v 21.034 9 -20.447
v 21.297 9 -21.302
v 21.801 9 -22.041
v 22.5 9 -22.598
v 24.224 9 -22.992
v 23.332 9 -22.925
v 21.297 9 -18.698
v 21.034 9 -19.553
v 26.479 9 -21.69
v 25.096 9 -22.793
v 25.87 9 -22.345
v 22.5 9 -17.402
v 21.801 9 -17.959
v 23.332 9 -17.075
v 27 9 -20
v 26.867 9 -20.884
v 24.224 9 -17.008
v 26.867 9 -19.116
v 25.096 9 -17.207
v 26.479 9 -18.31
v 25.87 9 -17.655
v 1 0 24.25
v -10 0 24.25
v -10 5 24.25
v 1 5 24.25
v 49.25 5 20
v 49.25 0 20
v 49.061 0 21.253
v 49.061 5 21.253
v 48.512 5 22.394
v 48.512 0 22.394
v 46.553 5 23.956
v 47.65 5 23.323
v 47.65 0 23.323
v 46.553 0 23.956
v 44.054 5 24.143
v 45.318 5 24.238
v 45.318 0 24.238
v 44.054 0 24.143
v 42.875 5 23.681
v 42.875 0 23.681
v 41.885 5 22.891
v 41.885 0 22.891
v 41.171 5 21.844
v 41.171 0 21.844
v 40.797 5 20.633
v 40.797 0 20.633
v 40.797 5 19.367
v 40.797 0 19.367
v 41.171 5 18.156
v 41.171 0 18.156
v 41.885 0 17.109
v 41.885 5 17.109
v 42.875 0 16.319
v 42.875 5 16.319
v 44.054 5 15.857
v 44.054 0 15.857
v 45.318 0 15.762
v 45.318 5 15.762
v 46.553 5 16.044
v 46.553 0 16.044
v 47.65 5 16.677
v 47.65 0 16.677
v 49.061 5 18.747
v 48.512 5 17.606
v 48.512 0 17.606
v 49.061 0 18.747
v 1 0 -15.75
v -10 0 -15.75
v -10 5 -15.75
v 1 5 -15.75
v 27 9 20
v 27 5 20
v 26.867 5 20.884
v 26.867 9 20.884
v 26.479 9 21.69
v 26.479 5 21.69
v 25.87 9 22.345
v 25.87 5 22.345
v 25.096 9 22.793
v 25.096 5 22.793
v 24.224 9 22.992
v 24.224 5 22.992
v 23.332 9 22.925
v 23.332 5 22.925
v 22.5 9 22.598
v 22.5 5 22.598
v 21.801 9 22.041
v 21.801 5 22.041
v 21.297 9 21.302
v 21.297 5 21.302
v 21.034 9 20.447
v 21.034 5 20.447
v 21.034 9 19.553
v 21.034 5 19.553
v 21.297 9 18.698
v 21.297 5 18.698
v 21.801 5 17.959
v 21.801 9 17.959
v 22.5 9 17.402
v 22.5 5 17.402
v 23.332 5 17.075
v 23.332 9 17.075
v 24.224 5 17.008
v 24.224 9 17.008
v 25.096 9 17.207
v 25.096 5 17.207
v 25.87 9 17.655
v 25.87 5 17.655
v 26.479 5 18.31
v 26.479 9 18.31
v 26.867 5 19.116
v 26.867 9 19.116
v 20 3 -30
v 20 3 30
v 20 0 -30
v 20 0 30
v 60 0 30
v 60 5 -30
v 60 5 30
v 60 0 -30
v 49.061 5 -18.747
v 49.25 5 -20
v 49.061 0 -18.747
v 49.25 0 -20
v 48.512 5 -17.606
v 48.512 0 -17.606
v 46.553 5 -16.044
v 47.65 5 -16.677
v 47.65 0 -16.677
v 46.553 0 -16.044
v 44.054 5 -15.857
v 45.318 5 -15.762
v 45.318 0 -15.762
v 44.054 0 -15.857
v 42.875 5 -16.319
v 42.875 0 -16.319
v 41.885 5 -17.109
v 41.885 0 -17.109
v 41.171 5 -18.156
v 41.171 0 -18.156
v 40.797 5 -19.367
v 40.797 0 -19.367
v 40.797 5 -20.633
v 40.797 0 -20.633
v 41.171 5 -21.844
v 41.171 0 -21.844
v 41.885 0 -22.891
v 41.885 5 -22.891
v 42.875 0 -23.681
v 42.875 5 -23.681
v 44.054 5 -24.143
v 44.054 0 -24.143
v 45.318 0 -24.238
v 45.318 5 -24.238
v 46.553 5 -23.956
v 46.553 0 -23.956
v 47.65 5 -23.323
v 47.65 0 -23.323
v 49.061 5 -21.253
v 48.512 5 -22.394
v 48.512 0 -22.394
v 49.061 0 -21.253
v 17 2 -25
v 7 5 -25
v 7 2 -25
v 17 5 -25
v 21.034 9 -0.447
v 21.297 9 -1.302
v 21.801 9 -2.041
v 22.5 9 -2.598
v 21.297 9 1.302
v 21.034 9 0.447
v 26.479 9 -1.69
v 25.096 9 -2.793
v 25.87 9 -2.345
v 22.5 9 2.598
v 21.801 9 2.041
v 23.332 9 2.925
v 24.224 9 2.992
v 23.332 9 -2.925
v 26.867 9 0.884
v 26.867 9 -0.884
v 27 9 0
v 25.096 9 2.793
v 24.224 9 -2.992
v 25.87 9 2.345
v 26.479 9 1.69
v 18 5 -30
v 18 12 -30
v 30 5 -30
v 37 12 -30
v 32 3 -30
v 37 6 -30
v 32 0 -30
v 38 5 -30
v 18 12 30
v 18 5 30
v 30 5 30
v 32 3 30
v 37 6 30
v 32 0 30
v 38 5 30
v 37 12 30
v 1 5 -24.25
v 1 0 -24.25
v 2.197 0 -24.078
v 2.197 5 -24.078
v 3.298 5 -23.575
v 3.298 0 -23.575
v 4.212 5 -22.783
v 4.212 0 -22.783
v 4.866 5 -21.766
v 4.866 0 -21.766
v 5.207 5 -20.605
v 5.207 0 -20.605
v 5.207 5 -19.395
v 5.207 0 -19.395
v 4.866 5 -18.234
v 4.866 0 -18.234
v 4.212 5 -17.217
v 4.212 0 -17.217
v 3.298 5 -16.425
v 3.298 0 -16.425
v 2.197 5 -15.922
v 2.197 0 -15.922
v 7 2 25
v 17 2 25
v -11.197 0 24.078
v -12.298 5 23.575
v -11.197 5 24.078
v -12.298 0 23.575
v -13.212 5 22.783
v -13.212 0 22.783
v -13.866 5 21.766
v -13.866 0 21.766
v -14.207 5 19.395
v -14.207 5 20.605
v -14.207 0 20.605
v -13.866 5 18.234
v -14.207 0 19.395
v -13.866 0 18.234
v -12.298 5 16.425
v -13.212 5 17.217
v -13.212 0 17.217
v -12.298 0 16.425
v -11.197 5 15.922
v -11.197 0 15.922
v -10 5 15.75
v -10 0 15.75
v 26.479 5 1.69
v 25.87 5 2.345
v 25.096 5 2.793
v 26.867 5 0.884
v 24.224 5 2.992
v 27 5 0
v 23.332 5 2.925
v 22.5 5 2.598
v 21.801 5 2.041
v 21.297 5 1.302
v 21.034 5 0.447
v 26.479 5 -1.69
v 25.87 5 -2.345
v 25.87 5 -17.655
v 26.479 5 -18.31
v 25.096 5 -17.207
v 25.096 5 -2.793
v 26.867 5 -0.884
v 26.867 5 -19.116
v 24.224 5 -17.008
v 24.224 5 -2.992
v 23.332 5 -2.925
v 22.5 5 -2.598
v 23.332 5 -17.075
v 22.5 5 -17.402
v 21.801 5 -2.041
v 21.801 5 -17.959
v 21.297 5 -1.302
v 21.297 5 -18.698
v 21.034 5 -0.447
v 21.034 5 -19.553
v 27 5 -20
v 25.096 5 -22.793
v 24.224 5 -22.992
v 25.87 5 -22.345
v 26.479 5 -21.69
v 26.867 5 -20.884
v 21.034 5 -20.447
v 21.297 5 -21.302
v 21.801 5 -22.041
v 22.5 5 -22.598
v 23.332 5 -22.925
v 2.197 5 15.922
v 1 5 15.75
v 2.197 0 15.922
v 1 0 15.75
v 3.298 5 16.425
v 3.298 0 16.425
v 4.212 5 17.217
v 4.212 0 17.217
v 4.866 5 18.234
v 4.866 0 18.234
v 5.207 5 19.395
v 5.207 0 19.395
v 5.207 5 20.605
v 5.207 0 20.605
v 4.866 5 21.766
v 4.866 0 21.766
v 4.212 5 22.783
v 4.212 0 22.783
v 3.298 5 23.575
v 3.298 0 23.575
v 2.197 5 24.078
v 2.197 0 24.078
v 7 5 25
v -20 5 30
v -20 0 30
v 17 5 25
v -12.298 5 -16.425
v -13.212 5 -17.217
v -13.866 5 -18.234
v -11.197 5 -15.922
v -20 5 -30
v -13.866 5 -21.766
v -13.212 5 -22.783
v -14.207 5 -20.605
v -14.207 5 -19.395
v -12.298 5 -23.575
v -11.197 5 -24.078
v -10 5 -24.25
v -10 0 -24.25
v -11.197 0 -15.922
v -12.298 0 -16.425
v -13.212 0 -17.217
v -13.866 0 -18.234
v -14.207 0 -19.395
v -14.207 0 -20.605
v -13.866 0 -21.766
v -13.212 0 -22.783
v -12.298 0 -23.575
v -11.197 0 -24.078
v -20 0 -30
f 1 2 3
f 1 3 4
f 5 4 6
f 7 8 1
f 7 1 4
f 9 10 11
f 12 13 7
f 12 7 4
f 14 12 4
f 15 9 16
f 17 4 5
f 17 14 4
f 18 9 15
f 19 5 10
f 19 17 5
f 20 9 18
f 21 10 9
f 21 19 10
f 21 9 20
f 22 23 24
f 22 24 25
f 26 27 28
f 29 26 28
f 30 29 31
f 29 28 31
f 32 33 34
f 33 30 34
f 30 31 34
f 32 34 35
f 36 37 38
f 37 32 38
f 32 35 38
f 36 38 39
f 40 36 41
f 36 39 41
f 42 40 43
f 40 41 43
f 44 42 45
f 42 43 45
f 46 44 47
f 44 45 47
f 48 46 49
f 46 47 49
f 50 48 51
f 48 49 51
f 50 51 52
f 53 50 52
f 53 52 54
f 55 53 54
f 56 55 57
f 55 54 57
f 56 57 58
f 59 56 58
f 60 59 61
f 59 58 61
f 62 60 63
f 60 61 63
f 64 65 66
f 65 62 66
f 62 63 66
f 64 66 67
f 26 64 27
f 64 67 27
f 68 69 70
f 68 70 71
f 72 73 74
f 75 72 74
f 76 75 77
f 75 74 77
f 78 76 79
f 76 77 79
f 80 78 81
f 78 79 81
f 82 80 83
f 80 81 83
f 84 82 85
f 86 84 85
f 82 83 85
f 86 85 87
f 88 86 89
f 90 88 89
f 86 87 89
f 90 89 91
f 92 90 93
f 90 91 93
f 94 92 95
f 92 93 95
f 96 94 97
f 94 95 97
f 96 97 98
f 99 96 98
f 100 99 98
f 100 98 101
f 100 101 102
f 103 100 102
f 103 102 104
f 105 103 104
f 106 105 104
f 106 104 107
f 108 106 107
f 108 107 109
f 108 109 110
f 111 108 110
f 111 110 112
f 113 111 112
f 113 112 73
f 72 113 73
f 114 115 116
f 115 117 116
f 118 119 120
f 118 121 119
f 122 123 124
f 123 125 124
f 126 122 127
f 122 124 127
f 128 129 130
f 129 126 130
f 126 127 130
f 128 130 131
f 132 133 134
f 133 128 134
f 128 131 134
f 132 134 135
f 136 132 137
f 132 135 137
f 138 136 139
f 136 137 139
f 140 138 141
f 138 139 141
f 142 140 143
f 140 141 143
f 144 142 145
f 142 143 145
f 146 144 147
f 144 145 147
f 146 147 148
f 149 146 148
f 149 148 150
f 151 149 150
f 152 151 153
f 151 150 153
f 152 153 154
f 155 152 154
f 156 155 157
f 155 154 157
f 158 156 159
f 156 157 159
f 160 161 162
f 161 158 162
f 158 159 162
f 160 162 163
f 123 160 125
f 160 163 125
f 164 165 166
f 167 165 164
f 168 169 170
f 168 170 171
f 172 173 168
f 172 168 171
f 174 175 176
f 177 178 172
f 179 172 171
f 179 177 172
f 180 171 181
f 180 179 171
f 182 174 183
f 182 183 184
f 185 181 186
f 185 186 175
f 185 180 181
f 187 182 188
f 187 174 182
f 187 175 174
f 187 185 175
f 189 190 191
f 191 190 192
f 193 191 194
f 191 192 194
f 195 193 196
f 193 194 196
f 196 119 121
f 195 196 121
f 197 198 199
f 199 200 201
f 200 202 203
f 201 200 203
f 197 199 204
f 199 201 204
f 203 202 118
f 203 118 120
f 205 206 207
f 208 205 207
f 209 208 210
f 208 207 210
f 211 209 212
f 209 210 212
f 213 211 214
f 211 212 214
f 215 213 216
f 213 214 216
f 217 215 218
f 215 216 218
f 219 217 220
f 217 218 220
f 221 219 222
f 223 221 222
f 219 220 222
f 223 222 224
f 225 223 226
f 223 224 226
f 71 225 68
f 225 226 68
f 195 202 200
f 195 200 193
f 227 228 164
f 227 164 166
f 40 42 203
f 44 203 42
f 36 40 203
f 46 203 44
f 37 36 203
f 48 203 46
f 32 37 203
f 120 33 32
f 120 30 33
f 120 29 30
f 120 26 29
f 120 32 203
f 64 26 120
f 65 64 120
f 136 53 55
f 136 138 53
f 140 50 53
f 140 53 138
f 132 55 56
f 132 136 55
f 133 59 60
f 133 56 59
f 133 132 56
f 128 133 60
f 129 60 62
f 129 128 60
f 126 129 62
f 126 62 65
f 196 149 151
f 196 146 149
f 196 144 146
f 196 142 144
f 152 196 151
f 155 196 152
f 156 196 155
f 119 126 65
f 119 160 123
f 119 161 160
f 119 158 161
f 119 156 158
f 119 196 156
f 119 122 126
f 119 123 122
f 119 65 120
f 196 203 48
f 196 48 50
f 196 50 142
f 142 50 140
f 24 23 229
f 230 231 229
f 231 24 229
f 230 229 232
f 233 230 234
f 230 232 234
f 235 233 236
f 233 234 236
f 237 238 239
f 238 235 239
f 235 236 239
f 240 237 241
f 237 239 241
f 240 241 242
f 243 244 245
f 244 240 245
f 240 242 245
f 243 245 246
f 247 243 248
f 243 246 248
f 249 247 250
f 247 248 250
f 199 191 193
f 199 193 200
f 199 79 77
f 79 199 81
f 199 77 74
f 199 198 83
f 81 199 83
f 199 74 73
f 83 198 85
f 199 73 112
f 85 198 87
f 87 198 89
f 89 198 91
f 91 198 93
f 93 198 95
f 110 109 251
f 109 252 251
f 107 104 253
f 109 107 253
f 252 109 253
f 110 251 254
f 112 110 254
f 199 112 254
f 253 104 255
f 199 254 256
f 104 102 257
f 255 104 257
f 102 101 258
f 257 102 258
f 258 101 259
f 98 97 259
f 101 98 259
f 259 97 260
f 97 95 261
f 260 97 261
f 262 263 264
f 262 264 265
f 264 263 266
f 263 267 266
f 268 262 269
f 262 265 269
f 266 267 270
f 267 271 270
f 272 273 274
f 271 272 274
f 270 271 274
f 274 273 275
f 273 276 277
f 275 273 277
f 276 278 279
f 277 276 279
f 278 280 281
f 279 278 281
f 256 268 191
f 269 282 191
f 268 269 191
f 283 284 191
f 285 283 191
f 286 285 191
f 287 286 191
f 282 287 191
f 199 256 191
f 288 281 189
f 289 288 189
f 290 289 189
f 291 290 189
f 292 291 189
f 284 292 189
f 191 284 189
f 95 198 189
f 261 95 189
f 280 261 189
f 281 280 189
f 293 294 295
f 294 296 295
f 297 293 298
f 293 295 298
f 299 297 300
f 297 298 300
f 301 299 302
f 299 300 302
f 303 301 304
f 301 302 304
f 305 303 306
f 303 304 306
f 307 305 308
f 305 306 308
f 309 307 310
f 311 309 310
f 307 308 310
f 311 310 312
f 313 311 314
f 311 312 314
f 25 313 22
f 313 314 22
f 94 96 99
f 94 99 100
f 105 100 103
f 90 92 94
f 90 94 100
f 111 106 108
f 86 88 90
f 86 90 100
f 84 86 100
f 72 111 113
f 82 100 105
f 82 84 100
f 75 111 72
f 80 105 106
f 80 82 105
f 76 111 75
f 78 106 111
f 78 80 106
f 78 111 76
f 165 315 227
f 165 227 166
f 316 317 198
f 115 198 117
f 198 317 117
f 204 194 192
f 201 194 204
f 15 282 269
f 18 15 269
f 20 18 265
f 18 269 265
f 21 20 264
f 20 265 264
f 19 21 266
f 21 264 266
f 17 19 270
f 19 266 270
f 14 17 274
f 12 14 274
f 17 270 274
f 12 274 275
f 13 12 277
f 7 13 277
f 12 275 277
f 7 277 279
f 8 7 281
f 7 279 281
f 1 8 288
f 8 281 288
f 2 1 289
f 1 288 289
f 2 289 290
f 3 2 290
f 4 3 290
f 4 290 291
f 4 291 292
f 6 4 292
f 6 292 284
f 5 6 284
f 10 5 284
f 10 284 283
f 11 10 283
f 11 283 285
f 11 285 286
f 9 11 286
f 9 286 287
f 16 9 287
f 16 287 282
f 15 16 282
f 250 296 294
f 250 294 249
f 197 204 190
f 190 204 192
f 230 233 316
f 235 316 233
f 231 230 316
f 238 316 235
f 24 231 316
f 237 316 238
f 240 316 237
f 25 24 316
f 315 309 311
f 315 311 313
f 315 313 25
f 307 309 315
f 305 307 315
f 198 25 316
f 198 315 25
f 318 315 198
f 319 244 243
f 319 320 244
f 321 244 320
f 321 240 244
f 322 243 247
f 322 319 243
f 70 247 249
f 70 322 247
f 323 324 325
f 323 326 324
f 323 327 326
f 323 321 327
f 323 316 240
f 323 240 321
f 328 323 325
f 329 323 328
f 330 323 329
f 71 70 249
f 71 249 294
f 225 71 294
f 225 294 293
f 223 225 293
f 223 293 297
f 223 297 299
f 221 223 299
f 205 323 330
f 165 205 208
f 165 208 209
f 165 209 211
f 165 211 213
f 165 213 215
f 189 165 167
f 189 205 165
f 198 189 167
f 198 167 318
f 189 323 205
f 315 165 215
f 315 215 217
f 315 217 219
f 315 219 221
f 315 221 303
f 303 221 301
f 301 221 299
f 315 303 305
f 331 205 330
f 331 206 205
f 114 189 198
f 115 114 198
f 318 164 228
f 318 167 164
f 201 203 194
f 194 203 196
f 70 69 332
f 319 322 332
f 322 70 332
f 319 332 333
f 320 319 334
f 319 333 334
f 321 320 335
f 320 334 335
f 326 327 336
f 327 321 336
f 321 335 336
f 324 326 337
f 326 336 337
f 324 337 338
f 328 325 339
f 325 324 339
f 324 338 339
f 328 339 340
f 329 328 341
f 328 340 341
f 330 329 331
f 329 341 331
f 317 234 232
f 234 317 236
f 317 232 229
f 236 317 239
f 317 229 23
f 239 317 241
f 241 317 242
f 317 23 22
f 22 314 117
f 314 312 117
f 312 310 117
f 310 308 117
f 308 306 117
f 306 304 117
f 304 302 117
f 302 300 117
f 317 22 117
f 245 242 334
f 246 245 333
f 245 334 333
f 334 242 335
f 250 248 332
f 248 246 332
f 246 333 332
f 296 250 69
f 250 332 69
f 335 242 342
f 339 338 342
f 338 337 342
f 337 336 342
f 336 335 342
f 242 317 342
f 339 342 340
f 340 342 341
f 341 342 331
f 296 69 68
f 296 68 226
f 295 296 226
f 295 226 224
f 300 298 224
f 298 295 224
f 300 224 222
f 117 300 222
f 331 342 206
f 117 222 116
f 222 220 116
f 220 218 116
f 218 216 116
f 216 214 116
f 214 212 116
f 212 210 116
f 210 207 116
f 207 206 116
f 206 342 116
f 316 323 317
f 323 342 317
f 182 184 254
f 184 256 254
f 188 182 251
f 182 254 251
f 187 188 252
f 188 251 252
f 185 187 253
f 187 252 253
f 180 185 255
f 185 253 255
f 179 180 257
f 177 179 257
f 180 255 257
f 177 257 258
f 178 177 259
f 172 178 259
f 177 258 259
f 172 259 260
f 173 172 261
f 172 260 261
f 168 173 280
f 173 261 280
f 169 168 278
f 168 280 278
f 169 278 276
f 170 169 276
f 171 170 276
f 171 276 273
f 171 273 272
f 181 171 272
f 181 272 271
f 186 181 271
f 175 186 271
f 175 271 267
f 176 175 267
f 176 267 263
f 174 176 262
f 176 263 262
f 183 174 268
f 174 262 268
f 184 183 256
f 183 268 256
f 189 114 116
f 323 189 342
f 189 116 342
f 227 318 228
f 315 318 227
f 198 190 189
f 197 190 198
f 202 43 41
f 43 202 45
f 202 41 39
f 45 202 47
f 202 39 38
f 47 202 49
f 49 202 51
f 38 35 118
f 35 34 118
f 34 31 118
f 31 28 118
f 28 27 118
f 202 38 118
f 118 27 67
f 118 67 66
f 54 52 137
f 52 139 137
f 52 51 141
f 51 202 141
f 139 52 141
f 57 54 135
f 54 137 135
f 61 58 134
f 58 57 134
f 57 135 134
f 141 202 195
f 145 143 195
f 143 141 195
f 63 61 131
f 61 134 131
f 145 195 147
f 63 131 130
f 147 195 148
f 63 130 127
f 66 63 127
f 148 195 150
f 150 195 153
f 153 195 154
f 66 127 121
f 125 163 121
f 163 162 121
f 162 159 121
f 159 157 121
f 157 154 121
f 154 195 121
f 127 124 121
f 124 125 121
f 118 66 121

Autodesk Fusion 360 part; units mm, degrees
sketch "Sketch1" plane through (0, 0, 0) normal (0, 1, 0) x (1, 0, 0)
  line L0 (20, 30) -> (-20, 30)
  line L1 (-20, 30) -> (-20, -30)
  line L2 (-20, -30) -> (20, -30)
  line L3 (20, -30) -> (20, 30)
  line L4 (20, 30) -> (-20, -30) construction
  line L5 (-20, 30) -> (20, -30) construction
  circle A0 centre (-10, 20) radius 4.25
  circle A1 centre (1, 20) radius 4.25
  circle A2 centre (-10, -20) radius 4.25
  circle A3 centre (1, -20) radius 4.25
  line L6 (-10, 15.75) -> (1, 15.75)
  line L7 (1, 15.75) -> (1, 24.25)
  line L8 (1, 24.25) -> (-10, 24.25)
  line L9 (-10, 24.25) -> (-10, 15.75)
  line L10 (-10, -24.25) -> (1, -24.25)
  line L11 (1, -24.25) -> (1, -15.75)
  line L12 (1, -15.75) -> (-10, -15.75)
  line L13 (-10, -15.75) -> (-10, -24.25)
  dimension "d1" = 40
  dimension "d2" = 60
  dimension "d3" = 8.5
  dimension "d4" = 8.5
  dimension "d5" = 8.5
  dimension "d6" = 8.5
extrude "Extrude1" add sketch "Sketch1" along normal blind 5 makes body 1
sketch "Sketch4" plane through (0, 0, 0) normal (0, 1, 0) x (1, 0, 0)
  line L0 (30, 30) -> (60, 30)
  line L1 (60, 30) -> (60, -30)
  line L2 (60, -30) -> (30, -30)
  line L3 (30, -30) -> (30, 30)
  circle A0 centre (45, 20) radius 4.25
  circle A1 centre (45, -20) radius 4.25
  dimension "d18" = 8.5
  dimension "d19" = 8.5
extrude "Extrude4" add sketch "Sketch4" along normal blind 5 separate body makes body 2
sketch "Sketch6" plane through (0, 5, 0) normal (0, 1, 0) x (-1, 0, 0)
  circle A0 centre (-45, -20) radius 4.25
  circle A1 centre (-45, 20) radius 4.25
  line L0 (-30, 30) -> (-60, 30)
  line L1 (-60, 30) -> (-60, -30)
  line L2 (-60, -30) -> (-30, -30)
  line L3 (-30, -30) -> (-30, 30)
  line L4 (-30, -30) -> (-37, -30)
  line L5 (-37, -30) -> (-37, 30)
  line L6 (-37, 30) -> (-30, 30)
  line L7 (-30, 30) -> (-30, -30)
extrude "Extrude7" add sketch "Sketch6" along normal blind 7 contours L0 L2 L3 L4 L5 L6 L7 bodies 2
sketch "Sketch7" plane through (30, 0, 0) normal (-1, 0, 0) x (0, 0, 1)
  line L0 (-30, 0) -> (30, 0)
  line L1 (30, 0) -> (30, 12)
  line L2 (30, 12) -> (-30, 12)
  line L3 (-30, 12) -> (-30, 0)
  line L4 (-30, 12) -> (30, 12)
  line L5 (30, 12) -> (30, 5)
  line L6 (30, 5) -> (-30, 5)
  line L7 (-30, 5) -> (-30, 12)
extrude "Extrude9" add sketch "Sketch7" along normal blind 12 contours L1 L2 L3 L4 L5 L6 L7 bodies 2
sketch "Sketch8" plane through (0, 5, 0) normal (0, 1, 0) x (-1, 0, 0)
  line L0 (10, 15.75) -> (-1, 15.75)
  arc A0 (-1, 24.25) -> (-1, 15.75) centre (-1, 20) ccw
  line L1 (-1, 24.25) -> (10, 24.25)
  arc A1 (10, 15.75) -> (10, 24.25) centre (10, 20) ccw
  line L2 (10, -24.25) -> (-1, -24.25)
  arc A2 (-1, -15.75) -> (-1, -24.25) centre (-1, -20) ccw
  line L3 (-1, -15.75) -> (10, -15.75)
  arc A3 (10, -24.25) -> (10, -15.75) centre (10, -20) ccw
  line L4 (-20, 30) -> (-20, -30)
  line L5 (-20, -30) -> (20, -30)
  line L6 (20, -30) -> (20, 30)
  line L7 (20, 30) -> (-20, 30)
  line L8 (-7, -25) -> (-17, -25)
  line L9 (-17, -25) -> (-17, 25)
  line L10 (-17, 25) -> (-7, 25)
  line L11 (-7, 25) -> (-7, -25)
extrude "Extrude10" cut sketch "Sketch8" against normal blind 3 contours L8 L9 L10 L11 bodies 1
sketch "Sketch9" plane through (0, 5, 0) normal (0, -1, 0) x (1, 0, 0)
  line L0 (30, -30) -> (30, 30)
  line L1 (30, 30) -> (18, 30)
  line L2 (18, 30) -> (18, -30)
  line L3 (18, -30) -> (30, -30)
  circle A0 centre (24, 20) radius 3
  circle A1 centre (24, 0) radius 3
  circle A2 centre (24, -20) radius 3
extrude "Extrude11" cut sketch "Sketch9" against normal blind 4 contours A0 | A1 | A2 bodies 2
extrude "Extrude12" cut 1 faces at (30, 1.6667, 10) along direction (1, 0, 0) blind 2 on bodies 2 bodies 2
chamfer "Chamfer1" distance 2 angle 45 1 edges at (20, 5, 0) on bodies 1
chamfer "Chamfer2" distance 2 angle 45 1 edges at (32, 5, 0) on bodies 2
chamfer "Chamfer3" distance 1 angle 45 1 edges at (37, 5, 0) on bodies 2
